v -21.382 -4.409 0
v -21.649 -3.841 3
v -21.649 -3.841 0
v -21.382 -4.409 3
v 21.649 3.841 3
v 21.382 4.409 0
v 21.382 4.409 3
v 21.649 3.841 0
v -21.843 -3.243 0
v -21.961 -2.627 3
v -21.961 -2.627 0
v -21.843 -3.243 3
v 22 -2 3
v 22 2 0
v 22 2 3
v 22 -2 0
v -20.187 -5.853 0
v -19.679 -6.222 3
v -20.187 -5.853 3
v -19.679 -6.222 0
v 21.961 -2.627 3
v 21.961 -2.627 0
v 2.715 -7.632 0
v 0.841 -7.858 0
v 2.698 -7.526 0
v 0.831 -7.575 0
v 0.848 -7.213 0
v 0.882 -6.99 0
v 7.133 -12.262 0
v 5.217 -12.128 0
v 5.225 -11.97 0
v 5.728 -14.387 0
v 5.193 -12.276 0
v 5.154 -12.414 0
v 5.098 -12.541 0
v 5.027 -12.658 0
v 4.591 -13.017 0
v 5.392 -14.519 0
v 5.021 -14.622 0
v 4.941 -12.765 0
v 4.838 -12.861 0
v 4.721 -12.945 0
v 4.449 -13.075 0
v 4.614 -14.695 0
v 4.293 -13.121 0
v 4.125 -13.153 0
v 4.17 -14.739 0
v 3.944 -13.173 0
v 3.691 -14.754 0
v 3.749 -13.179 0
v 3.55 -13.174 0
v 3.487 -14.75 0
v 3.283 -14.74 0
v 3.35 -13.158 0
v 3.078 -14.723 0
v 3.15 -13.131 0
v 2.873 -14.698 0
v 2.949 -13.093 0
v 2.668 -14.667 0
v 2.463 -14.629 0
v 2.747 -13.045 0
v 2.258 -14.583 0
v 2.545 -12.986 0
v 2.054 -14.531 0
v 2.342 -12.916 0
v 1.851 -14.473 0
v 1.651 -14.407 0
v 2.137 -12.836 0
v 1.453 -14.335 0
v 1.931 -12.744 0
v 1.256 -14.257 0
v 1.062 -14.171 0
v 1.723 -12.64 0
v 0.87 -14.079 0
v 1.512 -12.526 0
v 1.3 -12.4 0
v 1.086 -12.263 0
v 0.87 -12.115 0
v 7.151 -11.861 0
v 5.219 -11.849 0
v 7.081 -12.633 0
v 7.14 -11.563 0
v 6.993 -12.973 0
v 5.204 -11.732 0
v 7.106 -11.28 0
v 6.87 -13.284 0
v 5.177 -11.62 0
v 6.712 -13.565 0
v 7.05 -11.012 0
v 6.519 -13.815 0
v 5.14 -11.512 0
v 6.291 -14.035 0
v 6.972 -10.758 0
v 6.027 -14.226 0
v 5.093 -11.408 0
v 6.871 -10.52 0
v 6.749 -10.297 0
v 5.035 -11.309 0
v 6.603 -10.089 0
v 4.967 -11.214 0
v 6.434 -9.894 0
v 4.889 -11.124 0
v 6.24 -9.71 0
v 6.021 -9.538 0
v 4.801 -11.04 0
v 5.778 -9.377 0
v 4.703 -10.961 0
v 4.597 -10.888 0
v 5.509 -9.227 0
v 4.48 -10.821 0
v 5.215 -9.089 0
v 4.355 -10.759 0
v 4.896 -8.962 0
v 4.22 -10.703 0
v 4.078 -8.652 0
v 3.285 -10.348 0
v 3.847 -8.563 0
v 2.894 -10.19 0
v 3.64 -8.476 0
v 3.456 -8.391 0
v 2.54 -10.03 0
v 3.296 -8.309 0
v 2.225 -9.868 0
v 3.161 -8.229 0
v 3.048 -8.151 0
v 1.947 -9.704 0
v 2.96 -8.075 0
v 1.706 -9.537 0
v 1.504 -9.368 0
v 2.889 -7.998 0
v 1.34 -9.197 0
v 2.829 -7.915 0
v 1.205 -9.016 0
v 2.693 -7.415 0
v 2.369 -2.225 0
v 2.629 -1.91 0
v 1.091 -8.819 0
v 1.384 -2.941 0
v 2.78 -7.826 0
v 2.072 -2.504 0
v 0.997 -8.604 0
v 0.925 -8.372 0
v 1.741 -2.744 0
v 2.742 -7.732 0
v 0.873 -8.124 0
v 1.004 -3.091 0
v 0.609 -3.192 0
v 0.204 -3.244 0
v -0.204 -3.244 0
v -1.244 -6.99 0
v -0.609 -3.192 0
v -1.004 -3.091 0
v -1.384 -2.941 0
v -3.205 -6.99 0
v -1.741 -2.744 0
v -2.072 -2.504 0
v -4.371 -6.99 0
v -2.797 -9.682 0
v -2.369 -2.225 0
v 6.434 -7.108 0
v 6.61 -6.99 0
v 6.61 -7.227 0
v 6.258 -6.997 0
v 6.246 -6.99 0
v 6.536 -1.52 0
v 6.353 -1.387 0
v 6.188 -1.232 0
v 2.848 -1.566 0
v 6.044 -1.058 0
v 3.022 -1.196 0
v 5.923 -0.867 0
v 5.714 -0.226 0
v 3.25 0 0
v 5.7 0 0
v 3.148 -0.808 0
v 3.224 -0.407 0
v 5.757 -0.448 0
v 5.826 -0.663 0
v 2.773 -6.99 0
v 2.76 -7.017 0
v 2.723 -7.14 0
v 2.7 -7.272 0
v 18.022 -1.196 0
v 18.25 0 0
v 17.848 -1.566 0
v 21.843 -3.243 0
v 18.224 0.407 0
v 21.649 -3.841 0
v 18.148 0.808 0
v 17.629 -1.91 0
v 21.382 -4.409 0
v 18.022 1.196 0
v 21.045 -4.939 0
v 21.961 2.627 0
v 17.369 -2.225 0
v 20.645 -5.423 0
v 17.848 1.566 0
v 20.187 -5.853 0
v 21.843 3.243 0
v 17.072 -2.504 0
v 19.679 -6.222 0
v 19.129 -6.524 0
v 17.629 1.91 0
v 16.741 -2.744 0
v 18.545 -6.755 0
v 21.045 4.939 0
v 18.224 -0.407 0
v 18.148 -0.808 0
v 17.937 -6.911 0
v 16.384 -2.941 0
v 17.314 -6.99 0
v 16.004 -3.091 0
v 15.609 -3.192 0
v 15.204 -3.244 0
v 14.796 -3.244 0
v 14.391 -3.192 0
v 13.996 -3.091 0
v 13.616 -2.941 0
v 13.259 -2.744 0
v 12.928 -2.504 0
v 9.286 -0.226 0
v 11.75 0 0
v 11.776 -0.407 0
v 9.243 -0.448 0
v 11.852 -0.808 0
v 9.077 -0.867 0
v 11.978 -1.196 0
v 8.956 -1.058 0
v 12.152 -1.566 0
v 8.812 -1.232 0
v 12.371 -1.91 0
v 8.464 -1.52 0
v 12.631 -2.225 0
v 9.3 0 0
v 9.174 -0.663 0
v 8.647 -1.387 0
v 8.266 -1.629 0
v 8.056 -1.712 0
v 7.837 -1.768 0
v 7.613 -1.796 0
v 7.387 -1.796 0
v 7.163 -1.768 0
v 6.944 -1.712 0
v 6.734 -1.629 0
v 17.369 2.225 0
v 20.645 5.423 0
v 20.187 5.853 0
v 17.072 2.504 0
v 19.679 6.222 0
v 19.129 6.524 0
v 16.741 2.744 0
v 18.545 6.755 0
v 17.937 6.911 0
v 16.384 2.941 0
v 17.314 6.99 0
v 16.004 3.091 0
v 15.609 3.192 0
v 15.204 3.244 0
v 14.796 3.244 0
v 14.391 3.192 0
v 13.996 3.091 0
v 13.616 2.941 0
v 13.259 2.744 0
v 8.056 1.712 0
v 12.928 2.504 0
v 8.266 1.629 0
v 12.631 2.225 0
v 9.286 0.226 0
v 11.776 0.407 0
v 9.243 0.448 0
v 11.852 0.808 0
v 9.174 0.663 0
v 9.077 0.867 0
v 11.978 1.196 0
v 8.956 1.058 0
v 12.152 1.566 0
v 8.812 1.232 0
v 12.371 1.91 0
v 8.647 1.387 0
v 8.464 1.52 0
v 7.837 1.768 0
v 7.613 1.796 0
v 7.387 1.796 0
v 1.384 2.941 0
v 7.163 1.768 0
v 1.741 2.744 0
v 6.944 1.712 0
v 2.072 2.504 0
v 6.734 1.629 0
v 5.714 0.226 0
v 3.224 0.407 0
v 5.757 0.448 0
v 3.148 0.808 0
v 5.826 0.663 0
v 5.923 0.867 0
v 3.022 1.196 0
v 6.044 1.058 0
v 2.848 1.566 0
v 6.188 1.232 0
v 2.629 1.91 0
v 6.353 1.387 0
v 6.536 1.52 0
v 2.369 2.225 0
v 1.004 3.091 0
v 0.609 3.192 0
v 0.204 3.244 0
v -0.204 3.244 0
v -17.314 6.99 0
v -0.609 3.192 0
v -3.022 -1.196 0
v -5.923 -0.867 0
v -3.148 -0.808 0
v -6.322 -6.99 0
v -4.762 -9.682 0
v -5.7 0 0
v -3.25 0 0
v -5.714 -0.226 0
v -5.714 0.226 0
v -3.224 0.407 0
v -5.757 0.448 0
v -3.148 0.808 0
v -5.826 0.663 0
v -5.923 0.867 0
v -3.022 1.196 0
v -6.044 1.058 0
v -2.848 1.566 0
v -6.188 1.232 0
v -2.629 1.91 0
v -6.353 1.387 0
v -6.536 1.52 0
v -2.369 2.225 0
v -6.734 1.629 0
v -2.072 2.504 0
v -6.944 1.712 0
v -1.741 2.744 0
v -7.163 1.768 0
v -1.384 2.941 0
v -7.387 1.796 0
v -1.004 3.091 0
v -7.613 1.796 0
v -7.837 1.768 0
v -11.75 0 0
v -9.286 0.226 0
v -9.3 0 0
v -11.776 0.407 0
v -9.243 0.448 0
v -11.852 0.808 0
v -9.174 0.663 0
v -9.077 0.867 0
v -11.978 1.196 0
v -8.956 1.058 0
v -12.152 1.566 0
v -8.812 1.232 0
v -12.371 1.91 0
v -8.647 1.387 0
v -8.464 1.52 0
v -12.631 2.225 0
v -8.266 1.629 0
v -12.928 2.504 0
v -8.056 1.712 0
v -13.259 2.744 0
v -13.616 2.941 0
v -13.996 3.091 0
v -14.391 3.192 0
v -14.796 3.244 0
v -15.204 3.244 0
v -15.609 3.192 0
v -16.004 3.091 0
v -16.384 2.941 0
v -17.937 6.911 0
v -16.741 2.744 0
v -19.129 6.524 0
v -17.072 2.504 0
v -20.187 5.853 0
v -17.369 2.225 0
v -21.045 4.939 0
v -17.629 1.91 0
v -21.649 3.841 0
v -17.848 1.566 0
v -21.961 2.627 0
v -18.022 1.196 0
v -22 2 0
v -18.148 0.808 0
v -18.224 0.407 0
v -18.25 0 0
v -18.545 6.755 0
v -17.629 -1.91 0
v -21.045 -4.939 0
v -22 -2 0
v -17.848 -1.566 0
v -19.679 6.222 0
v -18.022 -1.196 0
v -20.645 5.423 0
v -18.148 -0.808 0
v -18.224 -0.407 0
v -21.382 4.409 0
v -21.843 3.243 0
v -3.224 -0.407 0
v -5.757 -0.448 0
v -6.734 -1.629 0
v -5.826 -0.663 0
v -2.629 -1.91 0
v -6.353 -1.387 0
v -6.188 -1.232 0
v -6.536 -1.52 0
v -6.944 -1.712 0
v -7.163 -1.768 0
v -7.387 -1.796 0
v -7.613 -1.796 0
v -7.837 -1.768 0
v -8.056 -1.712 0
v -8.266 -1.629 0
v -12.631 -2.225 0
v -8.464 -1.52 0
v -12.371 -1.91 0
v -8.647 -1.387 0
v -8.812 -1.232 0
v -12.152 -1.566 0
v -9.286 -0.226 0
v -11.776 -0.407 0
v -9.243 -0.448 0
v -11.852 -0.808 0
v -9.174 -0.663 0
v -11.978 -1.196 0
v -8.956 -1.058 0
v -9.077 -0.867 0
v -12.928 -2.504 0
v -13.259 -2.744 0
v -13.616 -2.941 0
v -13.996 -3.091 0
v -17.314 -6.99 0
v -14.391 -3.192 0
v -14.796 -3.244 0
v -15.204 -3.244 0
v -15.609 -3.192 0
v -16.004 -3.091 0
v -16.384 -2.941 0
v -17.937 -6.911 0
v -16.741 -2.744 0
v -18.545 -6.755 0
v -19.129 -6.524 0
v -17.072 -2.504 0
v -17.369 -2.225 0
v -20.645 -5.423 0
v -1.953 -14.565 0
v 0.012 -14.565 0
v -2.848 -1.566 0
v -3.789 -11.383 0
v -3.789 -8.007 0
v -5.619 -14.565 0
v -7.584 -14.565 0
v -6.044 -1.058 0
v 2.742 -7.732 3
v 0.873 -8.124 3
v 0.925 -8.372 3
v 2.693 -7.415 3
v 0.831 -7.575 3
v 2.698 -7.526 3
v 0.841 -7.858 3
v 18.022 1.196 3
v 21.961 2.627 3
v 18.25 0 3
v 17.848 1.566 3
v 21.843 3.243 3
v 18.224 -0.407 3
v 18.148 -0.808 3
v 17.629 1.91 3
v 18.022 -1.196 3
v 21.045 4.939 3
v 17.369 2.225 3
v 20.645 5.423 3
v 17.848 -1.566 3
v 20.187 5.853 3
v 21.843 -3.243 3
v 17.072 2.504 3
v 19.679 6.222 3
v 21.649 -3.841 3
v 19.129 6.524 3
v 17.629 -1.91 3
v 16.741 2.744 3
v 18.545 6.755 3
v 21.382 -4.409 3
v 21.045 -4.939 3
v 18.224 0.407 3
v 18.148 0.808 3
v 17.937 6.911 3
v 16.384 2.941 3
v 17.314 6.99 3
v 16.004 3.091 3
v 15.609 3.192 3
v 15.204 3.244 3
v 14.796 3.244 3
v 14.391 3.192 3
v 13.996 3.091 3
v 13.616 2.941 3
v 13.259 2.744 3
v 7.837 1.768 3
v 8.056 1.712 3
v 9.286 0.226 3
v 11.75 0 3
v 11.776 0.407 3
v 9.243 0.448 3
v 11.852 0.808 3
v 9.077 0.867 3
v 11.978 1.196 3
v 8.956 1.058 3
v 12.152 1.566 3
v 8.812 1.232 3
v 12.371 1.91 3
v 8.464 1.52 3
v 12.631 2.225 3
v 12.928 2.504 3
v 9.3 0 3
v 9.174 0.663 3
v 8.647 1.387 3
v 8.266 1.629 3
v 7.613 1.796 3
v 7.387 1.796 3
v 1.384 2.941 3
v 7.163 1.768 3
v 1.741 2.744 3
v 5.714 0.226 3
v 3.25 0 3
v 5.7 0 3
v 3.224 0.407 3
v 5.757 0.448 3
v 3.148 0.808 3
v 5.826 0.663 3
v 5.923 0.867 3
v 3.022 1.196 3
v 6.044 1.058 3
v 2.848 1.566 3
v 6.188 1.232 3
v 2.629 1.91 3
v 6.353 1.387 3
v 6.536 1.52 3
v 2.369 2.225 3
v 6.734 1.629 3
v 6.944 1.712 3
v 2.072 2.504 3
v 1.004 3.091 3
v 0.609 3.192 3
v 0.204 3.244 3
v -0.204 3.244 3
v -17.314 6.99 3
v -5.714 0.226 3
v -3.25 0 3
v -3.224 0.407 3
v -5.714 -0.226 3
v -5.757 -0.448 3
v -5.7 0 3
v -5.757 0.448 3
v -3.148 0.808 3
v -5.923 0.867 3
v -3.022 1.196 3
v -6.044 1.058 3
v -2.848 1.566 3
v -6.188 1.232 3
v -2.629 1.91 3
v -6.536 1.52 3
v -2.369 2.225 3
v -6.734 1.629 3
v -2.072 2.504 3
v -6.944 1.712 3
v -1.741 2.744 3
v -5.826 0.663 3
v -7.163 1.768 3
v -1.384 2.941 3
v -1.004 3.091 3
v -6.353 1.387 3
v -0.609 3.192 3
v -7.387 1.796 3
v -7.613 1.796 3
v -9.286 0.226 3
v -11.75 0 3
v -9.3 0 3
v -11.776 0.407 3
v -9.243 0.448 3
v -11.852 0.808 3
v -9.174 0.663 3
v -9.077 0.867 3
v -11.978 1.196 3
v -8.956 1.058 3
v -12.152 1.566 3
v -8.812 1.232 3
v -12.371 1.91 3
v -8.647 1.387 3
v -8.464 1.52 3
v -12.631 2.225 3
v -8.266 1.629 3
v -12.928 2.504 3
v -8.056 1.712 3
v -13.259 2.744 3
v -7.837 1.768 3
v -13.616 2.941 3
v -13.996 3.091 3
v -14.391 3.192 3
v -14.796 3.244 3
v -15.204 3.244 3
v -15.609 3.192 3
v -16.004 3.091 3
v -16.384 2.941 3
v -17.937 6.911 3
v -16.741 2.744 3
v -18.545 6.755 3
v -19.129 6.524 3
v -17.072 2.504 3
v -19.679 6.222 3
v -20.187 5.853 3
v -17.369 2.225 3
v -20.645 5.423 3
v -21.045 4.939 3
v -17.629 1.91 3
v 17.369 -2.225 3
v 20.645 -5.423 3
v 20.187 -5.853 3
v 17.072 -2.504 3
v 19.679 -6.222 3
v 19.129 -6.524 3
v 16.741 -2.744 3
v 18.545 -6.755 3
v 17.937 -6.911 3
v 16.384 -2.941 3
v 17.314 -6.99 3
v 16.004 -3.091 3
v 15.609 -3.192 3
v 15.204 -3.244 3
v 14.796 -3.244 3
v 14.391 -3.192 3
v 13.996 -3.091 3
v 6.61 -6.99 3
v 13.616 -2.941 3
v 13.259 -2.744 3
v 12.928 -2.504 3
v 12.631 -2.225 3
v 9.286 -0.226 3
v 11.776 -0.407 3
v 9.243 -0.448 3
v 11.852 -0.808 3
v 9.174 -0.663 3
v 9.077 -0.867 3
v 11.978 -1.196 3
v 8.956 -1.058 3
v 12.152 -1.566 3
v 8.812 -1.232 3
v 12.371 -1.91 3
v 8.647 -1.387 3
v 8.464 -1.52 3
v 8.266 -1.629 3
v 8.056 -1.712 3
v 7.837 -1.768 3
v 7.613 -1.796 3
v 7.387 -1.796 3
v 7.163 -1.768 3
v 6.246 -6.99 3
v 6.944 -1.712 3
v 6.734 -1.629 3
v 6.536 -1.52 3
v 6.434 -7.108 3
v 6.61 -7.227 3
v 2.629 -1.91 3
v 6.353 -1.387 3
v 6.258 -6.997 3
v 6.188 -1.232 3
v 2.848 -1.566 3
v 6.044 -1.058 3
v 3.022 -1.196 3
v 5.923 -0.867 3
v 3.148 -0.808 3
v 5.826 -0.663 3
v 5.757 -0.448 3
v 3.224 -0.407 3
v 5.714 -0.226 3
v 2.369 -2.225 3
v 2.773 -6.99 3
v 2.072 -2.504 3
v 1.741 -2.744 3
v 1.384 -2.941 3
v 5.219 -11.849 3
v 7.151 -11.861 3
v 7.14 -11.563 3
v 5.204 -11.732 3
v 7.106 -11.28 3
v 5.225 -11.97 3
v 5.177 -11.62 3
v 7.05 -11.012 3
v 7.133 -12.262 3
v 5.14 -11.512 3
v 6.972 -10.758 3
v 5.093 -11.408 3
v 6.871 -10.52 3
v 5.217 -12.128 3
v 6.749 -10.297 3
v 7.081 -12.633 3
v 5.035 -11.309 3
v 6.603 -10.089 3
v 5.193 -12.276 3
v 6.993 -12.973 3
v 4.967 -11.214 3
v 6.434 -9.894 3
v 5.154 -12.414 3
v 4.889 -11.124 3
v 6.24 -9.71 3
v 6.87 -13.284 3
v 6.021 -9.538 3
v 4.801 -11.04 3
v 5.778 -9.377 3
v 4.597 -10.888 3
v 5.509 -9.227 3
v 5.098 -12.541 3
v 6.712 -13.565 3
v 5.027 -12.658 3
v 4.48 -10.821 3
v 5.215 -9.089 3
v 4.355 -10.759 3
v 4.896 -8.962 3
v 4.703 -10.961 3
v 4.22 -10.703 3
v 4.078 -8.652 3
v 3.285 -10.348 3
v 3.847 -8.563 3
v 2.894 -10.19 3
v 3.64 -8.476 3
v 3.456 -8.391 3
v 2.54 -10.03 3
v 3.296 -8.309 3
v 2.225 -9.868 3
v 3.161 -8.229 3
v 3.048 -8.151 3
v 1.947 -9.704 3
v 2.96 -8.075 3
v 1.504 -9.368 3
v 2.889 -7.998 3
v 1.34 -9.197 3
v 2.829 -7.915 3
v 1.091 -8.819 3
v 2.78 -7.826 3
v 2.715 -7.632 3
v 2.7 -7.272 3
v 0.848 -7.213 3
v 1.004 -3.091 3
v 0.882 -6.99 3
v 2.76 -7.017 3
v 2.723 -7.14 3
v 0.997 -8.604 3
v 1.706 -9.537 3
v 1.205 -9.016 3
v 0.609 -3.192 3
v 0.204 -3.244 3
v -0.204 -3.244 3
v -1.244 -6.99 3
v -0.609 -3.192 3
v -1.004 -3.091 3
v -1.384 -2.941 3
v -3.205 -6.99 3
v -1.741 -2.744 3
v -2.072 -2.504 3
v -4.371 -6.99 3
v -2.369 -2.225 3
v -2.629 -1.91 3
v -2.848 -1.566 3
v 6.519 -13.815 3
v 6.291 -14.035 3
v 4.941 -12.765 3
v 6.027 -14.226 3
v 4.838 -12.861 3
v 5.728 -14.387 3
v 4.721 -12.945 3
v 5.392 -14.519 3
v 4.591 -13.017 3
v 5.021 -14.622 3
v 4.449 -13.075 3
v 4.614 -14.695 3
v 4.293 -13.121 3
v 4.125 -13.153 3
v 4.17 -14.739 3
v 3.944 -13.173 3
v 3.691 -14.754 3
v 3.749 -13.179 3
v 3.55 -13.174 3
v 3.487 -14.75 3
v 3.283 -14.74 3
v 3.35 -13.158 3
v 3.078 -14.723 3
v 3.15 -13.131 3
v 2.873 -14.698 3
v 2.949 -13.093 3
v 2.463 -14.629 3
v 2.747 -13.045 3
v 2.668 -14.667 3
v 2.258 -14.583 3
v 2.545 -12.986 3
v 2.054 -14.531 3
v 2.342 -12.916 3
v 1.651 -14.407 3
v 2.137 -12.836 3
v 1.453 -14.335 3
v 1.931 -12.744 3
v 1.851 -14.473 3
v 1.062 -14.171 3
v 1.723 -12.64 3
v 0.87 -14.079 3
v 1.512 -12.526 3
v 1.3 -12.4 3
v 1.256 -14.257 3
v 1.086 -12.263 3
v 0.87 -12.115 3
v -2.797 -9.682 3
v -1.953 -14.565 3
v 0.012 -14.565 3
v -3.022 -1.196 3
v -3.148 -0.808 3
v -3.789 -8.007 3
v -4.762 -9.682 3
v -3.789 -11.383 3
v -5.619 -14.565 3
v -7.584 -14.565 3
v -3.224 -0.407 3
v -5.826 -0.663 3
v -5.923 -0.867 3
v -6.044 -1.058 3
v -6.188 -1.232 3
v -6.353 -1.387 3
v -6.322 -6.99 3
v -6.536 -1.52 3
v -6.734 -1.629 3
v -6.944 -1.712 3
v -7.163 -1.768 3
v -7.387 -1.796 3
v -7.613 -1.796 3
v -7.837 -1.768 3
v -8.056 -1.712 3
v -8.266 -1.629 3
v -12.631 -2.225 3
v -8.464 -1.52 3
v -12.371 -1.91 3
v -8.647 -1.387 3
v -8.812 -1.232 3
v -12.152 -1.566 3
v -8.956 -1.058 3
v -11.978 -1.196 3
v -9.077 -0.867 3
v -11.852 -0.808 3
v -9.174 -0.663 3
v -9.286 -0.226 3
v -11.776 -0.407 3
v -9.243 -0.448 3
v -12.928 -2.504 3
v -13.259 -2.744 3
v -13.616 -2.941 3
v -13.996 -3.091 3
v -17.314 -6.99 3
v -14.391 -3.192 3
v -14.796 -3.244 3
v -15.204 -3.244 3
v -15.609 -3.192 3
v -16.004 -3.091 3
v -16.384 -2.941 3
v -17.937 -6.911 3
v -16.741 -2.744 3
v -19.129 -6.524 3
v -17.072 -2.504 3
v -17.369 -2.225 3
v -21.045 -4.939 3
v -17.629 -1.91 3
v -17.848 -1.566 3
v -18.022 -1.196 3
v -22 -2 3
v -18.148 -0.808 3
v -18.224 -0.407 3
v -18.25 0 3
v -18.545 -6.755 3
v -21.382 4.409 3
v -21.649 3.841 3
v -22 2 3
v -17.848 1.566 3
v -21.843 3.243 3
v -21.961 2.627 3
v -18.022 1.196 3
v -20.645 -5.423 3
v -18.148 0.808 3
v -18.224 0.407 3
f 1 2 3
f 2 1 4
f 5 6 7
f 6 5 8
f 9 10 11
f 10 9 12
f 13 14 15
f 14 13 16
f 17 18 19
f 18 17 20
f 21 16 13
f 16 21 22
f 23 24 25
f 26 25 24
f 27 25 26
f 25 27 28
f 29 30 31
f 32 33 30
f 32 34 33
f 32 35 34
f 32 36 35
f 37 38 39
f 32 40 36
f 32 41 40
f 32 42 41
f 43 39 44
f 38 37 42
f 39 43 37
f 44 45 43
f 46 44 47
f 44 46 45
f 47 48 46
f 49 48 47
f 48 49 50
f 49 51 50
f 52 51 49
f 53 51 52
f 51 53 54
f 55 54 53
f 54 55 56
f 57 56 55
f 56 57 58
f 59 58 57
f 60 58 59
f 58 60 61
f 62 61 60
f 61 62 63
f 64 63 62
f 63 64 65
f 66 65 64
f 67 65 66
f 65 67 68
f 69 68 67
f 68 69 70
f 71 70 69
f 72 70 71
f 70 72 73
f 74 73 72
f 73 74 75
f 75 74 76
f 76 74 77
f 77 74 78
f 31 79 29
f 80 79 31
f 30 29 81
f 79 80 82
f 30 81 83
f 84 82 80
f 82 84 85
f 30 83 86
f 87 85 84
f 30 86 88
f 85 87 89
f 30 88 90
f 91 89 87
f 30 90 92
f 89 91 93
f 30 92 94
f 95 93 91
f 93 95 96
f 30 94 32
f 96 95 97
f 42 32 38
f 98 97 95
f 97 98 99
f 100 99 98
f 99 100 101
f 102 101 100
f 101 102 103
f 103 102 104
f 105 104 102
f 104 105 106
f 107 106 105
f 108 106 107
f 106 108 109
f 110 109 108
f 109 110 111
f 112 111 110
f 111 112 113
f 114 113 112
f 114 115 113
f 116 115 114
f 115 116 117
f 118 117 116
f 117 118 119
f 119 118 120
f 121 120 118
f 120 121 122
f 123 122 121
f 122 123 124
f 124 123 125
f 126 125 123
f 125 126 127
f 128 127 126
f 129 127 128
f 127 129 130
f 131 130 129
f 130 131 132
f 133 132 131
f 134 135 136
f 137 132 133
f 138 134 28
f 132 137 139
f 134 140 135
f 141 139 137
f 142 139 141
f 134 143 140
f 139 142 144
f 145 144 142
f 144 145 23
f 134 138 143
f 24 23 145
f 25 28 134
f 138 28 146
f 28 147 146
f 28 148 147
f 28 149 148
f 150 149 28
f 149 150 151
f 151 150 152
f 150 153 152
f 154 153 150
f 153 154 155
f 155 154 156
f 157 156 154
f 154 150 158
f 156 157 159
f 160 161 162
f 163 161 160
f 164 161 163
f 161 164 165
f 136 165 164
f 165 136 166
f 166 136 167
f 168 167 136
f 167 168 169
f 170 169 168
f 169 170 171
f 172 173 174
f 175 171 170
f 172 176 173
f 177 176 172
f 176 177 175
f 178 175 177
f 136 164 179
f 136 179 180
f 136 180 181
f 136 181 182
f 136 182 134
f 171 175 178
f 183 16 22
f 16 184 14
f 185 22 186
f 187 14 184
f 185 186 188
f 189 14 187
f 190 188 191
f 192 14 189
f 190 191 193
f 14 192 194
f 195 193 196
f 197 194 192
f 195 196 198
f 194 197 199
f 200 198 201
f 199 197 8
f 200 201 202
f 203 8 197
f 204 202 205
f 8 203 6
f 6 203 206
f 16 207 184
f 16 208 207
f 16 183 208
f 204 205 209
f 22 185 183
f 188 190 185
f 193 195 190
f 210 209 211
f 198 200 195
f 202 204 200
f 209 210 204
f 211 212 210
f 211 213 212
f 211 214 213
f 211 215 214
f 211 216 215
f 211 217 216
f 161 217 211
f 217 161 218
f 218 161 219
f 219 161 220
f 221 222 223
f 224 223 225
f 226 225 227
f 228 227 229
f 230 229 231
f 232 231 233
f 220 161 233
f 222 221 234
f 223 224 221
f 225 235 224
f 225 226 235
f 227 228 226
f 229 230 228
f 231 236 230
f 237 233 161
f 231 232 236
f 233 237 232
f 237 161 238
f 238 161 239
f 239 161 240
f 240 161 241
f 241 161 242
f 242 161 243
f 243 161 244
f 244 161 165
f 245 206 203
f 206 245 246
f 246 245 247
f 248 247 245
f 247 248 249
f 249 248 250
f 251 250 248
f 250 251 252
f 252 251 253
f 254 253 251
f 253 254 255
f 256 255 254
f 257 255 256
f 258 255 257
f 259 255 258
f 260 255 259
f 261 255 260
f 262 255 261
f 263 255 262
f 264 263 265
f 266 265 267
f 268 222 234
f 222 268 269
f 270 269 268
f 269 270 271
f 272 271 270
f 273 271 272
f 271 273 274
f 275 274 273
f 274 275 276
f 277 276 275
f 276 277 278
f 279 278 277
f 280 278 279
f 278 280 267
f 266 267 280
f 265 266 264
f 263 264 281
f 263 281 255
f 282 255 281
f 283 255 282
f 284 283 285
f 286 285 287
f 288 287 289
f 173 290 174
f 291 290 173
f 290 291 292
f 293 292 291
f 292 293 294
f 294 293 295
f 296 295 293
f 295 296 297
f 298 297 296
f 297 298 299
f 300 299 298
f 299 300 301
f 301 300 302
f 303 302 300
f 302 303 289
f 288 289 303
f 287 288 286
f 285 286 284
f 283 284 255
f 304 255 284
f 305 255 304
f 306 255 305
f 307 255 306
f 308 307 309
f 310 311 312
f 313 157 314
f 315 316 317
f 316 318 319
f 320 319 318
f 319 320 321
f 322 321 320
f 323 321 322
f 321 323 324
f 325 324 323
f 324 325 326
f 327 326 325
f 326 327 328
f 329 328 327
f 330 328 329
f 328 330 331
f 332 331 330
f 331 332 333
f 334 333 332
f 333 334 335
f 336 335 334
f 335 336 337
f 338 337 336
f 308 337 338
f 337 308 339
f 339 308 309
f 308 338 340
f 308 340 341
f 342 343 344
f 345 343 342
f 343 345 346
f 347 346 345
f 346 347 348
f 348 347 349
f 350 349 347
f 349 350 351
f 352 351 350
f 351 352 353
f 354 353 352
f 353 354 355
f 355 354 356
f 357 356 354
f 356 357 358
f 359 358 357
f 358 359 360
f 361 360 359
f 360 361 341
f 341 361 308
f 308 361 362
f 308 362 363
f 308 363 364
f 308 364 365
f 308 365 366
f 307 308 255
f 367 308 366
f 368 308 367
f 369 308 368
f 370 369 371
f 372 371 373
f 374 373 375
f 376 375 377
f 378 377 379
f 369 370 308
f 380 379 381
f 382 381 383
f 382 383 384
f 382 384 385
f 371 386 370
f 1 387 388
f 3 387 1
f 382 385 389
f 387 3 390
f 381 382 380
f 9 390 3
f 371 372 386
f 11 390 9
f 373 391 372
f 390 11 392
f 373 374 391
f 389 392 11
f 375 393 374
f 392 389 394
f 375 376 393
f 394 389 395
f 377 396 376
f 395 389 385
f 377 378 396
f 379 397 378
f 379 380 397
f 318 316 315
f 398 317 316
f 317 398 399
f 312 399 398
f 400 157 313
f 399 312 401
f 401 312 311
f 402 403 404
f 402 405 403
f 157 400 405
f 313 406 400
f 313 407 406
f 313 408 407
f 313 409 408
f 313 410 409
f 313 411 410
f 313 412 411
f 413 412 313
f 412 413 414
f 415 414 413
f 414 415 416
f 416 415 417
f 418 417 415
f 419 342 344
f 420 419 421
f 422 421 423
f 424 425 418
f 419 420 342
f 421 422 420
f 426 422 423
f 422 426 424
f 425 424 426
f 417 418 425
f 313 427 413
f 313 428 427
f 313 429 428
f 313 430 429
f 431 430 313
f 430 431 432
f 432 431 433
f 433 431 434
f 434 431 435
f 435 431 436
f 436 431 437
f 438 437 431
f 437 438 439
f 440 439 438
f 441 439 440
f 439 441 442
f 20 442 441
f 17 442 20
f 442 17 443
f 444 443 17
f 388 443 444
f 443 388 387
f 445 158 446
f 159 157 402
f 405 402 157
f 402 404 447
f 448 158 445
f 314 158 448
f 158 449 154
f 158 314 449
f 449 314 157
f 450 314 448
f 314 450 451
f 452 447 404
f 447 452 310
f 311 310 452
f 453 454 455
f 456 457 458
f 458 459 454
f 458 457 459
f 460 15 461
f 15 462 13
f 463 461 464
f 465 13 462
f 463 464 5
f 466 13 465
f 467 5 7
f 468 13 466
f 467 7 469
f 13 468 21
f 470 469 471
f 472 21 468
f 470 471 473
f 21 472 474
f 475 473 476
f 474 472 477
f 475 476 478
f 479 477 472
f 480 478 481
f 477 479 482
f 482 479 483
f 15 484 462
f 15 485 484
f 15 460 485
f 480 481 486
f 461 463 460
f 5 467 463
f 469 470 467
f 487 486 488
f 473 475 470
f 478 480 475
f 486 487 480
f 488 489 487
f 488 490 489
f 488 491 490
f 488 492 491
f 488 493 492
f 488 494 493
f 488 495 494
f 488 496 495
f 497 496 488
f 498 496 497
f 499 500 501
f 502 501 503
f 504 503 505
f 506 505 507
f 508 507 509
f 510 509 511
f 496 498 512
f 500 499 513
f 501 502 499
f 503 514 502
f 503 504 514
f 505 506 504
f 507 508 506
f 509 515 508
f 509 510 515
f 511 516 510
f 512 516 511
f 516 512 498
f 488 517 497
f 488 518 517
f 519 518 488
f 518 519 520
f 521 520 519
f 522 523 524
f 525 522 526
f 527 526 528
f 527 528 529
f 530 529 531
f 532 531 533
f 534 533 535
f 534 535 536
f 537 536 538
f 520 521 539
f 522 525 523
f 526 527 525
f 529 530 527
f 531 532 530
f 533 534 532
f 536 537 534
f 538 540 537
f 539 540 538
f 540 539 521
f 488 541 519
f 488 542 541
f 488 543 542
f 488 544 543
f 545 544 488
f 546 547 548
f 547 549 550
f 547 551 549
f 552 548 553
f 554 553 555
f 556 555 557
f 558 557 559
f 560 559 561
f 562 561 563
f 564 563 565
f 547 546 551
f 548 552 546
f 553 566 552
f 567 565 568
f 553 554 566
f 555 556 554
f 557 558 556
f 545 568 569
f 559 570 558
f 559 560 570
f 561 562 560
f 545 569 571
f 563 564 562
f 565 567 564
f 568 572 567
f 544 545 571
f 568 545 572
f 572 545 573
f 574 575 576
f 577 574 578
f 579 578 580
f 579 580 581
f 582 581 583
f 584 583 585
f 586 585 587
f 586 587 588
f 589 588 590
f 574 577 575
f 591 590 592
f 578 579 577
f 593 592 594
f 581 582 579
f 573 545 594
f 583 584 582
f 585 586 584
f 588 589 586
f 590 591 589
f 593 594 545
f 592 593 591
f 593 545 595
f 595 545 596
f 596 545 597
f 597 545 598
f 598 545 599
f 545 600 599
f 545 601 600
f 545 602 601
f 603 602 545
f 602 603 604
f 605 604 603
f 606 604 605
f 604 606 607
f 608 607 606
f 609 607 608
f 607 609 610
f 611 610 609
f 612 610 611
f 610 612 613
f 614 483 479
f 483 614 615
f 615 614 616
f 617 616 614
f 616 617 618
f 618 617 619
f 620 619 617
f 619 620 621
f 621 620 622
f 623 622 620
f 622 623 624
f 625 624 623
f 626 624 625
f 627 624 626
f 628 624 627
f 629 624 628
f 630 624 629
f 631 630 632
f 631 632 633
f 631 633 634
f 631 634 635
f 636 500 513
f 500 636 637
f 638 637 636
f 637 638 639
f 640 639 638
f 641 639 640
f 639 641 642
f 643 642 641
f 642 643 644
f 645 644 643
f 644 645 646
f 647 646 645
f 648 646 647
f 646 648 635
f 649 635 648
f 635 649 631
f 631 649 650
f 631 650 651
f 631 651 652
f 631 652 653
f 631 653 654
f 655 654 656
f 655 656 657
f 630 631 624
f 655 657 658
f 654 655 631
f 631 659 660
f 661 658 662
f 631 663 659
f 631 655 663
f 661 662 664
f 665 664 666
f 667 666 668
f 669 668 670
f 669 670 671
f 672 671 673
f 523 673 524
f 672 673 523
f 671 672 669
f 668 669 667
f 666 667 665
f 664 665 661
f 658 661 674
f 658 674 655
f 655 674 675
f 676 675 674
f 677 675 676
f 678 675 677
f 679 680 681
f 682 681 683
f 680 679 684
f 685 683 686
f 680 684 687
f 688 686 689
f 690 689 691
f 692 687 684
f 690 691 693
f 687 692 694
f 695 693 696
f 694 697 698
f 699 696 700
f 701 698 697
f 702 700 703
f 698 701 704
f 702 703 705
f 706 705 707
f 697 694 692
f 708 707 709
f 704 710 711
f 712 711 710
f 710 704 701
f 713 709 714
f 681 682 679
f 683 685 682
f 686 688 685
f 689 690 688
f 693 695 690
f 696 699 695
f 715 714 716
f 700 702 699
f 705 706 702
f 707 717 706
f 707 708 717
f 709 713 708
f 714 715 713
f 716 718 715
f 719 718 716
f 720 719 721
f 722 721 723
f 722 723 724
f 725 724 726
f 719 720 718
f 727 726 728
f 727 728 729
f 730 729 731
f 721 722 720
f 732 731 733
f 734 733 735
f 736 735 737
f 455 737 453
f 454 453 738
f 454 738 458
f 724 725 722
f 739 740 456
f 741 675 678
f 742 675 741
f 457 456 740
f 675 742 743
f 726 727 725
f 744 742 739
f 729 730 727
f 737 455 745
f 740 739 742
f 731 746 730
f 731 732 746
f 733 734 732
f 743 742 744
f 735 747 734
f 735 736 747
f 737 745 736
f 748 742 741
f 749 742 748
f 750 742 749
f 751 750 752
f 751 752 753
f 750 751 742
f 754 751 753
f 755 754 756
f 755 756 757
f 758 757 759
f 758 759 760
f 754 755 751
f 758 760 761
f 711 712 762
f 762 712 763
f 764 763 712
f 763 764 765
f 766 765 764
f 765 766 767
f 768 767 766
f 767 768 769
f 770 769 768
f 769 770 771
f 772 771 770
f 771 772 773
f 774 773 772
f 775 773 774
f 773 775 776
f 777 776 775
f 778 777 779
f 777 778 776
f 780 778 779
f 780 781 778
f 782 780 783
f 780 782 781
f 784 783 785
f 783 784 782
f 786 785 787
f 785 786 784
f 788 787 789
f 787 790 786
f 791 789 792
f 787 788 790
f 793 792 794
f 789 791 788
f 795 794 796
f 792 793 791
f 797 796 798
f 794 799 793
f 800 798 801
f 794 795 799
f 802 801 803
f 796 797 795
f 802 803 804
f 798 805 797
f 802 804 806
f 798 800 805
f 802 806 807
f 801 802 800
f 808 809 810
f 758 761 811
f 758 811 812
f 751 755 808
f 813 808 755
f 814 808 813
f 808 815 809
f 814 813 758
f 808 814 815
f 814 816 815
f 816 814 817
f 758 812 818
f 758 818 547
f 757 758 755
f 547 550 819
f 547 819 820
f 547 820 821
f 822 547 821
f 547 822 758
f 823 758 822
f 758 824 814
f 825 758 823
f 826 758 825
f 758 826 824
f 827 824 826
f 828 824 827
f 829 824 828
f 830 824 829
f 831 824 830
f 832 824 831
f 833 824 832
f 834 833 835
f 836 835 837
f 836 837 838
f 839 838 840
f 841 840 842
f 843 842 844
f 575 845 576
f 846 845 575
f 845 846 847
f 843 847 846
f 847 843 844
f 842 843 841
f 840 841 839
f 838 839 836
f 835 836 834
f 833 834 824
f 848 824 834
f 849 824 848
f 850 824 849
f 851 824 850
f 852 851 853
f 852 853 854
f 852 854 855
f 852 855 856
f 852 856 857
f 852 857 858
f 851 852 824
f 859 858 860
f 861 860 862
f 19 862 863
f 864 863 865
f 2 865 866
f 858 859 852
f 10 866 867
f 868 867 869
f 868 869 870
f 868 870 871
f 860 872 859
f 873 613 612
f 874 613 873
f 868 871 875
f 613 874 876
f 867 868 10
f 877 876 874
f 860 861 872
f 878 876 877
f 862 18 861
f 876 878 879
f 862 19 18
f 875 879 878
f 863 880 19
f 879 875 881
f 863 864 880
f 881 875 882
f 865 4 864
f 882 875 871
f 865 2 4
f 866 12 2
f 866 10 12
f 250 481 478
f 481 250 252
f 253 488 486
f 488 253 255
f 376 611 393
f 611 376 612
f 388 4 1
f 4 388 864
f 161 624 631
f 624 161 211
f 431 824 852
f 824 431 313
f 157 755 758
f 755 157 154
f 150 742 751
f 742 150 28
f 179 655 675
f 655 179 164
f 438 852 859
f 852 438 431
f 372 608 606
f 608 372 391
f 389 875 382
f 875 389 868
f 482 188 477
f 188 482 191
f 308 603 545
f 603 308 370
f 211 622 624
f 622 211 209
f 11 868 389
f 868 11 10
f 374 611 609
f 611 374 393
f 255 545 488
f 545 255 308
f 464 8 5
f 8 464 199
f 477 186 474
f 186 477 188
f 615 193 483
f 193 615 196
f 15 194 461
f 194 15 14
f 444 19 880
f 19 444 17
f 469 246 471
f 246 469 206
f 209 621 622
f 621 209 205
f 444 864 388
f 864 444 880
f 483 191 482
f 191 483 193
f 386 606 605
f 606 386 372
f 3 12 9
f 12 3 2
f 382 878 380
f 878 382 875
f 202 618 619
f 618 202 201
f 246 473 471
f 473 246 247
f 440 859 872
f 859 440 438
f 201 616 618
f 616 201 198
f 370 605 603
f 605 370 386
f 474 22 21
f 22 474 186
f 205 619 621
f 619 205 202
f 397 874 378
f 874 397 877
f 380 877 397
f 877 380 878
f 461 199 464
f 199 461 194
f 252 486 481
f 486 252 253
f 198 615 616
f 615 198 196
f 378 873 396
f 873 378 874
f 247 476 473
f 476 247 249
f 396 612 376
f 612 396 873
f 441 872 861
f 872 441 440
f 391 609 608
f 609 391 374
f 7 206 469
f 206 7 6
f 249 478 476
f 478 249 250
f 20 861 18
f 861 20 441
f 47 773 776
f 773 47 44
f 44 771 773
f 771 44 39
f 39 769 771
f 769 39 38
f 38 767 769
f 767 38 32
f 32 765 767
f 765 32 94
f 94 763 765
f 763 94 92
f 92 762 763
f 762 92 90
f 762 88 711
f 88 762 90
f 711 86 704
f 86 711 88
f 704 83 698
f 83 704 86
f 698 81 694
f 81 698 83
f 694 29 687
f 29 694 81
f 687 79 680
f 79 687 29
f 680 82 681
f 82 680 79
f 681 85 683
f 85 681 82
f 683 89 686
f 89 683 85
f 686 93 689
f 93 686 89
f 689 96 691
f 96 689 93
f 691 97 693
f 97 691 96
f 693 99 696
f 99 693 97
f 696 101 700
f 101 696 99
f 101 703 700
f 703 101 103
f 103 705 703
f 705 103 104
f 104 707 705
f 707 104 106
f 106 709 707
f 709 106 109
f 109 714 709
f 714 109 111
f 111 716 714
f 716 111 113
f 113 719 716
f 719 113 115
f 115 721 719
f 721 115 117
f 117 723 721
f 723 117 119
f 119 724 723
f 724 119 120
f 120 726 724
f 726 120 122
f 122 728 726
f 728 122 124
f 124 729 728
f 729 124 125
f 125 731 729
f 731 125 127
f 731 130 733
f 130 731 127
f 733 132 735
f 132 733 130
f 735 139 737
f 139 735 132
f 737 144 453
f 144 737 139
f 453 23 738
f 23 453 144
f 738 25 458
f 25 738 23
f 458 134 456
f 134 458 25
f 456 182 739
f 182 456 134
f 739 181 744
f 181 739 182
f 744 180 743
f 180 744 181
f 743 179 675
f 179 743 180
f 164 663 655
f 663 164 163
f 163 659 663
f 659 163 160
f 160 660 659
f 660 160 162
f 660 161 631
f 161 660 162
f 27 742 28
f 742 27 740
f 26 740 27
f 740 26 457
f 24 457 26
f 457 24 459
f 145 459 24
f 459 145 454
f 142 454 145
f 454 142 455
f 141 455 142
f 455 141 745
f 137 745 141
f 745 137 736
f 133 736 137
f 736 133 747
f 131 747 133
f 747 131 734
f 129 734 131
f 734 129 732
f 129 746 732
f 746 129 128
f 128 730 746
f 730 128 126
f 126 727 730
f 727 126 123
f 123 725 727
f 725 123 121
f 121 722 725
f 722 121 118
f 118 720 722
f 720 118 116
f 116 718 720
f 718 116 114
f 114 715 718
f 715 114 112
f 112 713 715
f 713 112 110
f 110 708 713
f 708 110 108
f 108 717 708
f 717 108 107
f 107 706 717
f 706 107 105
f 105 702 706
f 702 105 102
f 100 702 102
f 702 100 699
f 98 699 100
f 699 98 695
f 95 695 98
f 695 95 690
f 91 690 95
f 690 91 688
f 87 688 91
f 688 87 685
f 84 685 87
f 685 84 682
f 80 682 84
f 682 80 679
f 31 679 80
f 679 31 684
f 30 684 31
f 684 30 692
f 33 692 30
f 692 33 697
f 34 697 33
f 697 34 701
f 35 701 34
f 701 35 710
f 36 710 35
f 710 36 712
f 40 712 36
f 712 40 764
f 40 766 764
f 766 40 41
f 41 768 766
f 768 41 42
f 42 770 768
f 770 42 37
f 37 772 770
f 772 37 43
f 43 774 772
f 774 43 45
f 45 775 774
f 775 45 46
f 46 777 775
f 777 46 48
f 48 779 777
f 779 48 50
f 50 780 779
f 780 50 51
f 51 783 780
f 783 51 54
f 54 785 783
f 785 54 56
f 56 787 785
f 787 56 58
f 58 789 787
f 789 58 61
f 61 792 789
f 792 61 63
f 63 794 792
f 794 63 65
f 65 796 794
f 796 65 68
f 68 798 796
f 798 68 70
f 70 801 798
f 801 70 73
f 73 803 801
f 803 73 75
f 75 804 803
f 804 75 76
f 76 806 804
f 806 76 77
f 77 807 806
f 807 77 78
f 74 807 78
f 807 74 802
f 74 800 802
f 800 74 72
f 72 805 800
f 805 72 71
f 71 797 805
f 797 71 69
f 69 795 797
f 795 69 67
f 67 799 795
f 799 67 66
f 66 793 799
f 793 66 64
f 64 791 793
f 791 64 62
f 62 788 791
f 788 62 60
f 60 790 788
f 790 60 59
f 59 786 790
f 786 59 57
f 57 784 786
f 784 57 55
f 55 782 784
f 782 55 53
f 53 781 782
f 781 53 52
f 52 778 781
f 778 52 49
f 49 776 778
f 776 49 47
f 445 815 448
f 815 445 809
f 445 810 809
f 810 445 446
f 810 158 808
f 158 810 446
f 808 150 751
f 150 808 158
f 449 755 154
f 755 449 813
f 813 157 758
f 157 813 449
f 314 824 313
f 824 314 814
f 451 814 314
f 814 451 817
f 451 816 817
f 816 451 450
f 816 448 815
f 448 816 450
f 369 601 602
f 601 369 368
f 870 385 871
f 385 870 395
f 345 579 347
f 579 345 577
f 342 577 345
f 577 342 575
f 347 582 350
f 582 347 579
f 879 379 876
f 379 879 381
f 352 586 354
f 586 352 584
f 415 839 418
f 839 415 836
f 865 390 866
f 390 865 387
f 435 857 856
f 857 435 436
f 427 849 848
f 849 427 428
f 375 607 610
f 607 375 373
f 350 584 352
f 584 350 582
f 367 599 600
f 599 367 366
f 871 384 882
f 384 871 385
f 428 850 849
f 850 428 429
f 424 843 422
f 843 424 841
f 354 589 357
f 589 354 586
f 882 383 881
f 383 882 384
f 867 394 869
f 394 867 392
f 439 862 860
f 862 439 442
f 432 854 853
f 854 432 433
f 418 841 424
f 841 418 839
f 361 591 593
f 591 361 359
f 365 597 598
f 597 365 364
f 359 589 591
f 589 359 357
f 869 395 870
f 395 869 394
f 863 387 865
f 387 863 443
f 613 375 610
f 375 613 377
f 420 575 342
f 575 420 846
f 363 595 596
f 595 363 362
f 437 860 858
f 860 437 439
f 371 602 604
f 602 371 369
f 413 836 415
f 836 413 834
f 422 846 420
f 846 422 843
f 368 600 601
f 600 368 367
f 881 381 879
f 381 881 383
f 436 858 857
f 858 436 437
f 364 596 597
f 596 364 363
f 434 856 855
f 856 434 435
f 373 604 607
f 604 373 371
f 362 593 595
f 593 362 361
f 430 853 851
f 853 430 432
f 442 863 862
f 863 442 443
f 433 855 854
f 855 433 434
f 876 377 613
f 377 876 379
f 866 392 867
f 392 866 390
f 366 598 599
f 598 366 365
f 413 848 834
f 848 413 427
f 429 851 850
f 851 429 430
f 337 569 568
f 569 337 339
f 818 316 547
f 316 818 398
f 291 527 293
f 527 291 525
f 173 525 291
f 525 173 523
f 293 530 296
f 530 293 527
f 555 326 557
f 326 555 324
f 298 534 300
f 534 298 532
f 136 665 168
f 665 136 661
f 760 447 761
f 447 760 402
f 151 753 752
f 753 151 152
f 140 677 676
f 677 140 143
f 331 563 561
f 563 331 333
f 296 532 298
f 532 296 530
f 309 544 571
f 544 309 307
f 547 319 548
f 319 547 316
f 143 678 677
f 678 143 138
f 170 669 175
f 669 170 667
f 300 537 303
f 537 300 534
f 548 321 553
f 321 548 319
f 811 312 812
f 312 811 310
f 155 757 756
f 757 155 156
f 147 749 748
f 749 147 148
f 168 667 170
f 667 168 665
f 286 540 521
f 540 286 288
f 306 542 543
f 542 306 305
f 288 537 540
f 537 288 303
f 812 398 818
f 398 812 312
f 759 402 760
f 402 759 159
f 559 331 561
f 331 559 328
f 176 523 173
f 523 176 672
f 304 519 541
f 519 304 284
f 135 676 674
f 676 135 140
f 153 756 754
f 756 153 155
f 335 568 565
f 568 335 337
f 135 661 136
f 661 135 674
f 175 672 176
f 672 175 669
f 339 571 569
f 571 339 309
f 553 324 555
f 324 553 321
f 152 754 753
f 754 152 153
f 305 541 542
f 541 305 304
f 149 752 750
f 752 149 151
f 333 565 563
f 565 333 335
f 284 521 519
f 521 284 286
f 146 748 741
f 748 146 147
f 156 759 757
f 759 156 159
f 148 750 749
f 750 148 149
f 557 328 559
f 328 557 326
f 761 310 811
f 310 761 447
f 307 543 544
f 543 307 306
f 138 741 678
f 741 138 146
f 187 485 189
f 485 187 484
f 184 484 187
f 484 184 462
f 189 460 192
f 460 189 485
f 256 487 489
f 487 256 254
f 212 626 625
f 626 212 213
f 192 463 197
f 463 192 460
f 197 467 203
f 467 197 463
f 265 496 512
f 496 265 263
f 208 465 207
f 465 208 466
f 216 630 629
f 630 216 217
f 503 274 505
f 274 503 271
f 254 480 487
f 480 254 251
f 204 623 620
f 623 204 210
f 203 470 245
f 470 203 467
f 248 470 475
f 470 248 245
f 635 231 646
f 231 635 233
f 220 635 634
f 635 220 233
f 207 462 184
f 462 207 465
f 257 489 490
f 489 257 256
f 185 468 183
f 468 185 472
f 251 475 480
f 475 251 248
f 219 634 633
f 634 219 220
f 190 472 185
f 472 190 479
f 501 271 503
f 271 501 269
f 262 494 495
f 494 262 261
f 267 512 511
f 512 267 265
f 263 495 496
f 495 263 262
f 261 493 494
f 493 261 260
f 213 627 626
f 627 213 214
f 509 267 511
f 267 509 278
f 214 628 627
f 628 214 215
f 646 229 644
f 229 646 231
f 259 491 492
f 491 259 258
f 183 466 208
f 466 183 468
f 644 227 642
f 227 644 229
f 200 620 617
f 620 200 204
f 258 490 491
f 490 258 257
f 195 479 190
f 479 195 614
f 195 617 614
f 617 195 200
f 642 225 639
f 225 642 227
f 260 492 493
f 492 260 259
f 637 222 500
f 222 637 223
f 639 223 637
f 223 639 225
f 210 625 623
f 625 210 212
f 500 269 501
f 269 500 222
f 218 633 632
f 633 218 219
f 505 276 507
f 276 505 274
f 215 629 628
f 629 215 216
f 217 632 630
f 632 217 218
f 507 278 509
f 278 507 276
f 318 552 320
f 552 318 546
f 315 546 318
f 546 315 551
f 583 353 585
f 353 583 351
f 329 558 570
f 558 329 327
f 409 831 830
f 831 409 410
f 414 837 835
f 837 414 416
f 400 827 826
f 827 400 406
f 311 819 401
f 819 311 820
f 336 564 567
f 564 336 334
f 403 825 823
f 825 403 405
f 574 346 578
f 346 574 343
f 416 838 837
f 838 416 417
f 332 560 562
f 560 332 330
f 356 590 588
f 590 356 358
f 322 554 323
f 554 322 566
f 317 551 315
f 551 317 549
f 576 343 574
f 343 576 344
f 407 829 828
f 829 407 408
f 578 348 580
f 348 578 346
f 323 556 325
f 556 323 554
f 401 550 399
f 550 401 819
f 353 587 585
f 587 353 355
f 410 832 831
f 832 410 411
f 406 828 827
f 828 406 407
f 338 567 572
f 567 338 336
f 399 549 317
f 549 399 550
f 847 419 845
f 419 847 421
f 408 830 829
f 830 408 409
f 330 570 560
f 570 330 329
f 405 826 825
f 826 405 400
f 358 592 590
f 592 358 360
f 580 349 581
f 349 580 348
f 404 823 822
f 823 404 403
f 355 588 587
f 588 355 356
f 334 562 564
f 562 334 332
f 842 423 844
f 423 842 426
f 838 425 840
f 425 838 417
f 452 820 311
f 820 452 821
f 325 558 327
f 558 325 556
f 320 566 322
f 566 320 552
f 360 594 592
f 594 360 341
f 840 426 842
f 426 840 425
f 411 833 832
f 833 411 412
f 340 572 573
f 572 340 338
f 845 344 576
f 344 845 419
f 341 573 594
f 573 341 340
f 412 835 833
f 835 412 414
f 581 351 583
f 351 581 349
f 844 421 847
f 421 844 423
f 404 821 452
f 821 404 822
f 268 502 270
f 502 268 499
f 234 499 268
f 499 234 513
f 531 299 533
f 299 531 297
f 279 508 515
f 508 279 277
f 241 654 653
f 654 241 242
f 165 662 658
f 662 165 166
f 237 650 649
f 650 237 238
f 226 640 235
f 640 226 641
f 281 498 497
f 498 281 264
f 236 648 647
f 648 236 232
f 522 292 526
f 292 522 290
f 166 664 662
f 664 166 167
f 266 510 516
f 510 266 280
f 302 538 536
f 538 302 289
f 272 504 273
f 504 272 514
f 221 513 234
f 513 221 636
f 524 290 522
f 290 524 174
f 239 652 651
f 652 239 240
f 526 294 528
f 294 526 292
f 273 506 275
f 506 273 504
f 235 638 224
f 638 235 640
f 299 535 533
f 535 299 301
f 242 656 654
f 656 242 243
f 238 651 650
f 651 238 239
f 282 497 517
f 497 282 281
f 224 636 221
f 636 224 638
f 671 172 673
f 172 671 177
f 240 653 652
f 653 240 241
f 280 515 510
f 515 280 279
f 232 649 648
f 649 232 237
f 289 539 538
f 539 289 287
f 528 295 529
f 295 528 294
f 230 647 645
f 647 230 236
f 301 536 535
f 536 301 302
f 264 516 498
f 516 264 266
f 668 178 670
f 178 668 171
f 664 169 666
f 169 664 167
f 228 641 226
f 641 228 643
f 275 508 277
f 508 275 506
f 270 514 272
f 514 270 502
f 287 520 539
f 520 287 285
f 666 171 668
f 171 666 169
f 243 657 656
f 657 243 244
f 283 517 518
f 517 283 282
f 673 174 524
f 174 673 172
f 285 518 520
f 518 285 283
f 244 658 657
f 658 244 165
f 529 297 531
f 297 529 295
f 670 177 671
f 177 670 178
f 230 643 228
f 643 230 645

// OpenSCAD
$fn = 50;


difference() {
	union() {
		hull() {
			translate(v = [-17.0000000000, 2.0000000000, 0]) {
				cylinder(h = 3, r = 5);
			}
			translate(v = [17.0000000000, 2.0000000000, 0]) {
				cylinder(h = 3, r = 5);
			}
			translate(v = [-17.0000000000, -2.0000000000, 0]) {
				cylinder(h = 3, r = 5);
			}
			translate(v = [17.0000000000, -2.0000000000, 0]) {
				cylinder(h = 3, r = 5);
			}
		}
		translate(v = [0, -5, 0]) {
			linear_extrude(height = 3) {
				text(font = "DejaVu Sans Mono:style=Bold", halign = "center", size = 9.5000000000, text = "XS", valign = "top");
			}
		}
	}
	union() {
		translate(v = [-15.0000000000, 0.0000000000, 0]) {
			translate(v = [0, 0, -100]) {
				cylinder(h = 200, r = 3.2500000000);
			}
		}
		translate(v = [0, 0, -100]) {
			cylinder(h = 200, r = 3.2500000000);
		}
		translate(v = [15.0000000000, 0.0000000000, 0]) {
			translate(v = [0, 0, -100]) {
				cylinder(h = 200, r = 3.2500000000);
			}
		}
		translate(v = [-15.0000000000, 0.0000000000, 0]) {
			translate(v = [0, 0, -100]) {
				cylinder(h = 200, r = 1.8000000000);
			}
		}
		translate(v = [-7.5000000000, 0.0000000000, 0]) {
			translate(v = [0, 0, -100]) {
				cylinder(h = 200, r = 1.8000000000);
			}
		}
		translate(v = [0, 0, -100]) {
			cylinder(h = 200, r = 1.8000000000);
		}
		translate(v = [7.5000000000, 0.0000000000, 0]) {
			translate(v = [0, 0, -100]) {
				cylinder(h = 200, r = 1.8000000000);
			}
		}
		translate(v = [15.0000000000, 0.0000000000, 0]) {
			translate(v = [0, 0, -100]) {
				cylinder(h = 200, r = 1.8000000000);
			}
		}
	}
}
